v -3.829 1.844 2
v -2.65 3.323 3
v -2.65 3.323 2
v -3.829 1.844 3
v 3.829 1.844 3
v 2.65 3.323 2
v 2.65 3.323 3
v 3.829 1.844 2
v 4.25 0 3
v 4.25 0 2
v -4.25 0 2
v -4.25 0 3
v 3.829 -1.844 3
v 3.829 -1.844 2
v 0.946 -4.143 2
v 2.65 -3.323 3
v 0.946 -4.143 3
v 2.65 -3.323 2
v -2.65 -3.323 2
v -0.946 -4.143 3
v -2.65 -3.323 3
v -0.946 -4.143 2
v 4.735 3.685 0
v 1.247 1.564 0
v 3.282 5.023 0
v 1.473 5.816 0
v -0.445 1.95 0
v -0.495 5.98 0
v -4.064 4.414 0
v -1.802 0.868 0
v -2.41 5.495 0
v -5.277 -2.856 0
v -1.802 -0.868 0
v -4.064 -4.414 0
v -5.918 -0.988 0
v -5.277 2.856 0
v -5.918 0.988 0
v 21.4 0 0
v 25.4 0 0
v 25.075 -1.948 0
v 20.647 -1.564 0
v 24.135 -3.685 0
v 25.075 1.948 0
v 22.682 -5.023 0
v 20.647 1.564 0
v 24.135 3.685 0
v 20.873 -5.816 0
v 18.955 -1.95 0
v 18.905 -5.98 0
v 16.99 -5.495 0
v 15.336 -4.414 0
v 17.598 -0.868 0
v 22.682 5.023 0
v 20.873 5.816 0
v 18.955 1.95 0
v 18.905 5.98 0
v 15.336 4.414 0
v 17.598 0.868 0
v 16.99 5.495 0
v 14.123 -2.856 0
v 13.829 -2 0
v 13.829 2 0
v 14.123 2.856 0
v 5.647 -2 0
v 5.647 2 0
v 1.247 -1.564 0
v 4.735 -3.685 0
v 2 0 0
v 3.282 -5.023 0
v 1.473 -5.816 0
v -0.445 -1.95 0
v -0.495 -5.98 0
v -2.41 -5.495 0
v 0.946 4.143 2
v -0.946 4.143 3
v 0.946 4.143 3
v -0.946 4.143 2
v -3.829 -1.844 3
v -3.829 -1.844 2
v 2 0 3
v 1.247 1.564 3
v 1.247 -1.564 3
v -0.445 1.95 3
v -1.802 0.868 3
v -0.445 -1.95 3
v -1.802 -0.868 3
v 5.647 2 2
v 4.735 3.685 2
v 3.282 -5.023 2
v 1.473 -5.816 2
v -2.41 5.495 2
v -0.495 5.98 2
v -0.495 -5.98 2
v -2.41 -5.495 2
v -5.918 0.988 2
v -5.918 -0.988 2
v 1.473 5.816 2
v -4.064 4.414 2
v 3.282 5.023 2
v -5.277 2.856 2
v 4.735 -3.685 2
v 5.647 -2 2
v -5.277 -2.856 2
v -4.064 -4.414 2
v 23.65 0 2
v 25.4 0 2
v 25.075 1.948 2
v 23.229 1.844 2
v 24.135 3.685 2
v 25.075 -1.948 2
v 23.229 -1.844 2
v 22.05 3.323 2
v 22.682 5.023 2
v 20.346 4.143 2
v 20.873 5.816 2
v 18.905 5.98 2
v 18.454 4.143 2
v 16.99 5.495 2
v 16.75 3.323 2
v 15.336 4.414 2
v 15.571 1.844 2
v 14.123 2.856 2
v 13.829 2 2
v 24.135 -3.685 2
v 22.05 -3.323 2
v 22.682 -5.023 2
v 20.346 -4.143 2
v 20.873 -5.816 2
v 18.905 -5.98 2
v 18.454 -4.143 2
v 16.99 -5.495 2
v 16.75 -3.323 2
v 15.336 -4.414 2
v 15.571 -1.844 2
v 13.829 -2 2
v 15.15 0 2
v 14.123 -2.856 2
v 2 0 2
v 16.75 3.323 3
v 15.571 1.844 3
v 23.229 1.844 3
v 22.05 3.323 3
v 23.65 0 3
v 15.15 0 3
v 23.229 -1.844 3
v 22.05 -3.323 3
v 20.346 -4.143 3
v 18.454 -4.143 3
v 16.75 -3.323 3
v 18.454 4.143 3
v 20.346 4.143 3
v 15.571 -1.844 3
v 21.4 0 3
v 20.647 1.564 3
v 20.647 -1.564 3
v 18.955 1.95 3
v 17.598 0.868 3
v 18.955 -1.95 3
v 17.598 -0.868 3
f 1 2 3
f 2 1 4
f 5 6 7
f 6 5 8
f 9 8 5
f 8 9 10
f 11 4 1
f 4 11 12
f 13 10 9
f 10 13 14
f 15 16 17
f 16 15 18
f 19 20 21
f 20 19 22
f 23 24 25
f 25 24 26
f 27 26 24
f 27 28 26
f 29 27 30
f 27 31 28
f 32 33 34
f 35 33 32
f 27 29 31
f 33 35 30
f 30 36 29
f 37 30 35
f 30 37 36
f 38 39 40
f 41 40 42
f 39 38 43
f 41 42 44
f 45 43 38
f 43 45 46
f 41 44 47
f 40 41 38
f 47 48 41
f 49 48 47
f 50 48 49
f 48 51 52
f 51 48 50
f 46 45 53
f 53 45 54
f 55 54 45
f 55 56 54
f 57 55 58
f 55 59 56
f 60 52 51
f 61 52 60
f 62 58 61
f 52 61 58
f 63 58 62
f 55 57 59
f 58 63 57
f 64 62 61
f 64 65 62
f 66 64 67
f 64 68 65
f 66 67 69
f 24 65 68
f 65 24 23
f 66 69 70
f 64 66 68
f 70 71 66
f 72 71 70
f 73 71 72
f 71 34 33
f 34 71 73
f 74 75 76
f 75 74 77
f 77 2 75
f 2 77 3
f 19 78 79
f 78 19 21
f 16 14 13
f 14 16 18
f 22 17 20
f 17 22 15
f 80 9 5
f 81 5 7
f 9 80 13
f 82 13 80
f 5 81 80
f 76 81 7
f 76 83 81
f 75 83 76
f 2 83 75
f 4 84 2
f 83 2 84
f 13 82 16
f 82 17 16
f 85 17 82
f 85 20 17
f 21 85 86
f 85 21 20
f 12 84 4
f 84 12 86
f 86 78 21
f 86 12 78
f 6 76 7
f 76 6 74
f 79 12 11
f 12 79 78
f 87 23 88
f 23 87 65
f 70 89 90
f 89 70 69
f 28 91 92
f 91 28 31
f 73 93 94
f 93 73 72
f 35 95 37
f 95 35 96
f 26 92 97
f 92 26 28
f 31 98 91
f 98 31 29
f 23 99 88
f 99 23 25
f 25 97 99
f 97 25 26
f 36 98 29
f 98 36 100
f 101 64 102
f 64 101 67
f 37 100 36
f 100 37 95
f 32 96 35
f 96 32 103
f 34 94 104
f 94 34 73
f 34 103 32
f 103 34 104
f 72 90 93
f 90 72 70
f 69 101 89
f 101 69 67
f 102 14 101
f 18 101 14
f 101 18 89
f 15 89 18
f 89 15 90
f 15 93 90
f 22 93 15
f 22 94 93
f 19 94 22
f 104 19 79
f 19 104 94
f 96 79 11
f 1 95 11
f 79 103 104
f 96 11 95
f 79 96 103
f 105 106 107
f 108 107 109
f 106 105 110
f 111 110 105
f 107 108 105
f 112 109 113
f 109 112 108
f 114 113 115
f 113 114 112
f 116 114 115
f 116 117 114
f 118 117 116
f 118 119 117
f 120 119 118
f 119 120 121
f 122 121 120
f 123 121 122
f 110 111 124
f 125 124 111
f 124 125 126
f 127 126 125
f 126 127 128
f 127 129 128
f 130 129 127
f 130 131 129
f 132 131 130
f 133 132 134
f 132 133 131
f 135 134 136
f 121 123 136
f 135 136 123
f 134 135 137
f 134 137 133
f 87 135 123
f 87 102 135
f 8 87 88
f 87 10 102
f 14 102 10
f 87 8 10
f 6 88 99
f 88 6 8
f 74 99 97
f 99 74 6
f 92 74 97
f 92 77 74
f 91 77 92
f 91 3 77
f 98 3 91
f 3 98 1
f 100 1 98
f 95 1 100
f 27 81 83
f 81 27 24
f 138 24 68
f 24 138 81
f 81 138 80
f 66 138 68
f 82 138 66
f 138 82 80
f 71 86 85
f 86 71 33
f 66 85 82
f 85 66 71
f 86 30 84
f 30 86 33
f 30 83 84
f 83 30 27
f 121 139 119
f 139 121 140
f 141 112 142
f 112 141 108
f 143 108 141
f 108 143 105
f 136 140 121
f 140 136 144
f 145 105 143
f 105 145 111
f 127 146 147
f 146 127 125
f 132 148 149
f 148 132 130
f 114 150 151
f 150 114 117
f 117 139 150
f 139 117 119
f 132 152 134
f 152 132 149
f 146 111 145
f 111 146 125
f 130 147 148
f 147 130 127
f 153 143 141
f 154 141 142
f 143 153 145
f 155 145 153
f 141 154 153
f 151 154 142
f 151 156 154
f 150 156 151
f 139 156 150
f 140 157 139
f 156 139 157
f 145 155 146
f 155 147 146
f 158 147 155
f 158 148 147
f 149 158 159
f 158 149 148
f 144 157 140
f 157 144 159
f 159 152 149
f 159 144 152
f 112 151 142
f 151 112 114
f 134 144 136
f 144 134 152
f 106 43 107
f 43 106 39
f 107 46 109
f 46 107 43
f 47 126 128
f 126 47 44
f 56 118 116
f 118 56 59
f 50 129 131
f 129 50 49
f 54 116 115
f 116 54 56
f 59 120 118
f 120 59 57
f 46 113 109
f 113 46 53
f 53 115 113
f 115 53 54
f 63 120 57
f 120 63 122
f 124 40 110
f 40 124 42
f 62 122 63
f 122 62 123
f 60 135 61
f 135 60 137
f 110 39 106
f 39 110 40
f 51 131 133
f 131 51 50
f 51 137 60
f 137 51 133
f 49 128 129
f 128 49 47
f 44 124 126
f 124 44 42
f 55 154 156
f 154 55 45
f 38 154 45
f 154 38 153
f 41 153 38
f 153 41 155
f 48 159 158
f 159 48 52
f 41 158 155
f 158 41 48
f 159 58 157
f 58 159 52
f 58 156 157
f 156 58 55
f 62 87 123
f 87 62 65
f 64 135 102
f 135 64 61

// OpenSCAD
//cube(size=1);
downHolder();
translate(v = [19.4, 0, 0])downHolder();
translate(v = [2, -2, 0])cube(size = [15,4,2]);

module downHolder(){

	difference(){
		union(){
			cylinder(h = 3, r=8.5/2);
			cylinder(h = 2, r=6);
		}
		cylinder(h = 4, r=2);
	}
	;


}
